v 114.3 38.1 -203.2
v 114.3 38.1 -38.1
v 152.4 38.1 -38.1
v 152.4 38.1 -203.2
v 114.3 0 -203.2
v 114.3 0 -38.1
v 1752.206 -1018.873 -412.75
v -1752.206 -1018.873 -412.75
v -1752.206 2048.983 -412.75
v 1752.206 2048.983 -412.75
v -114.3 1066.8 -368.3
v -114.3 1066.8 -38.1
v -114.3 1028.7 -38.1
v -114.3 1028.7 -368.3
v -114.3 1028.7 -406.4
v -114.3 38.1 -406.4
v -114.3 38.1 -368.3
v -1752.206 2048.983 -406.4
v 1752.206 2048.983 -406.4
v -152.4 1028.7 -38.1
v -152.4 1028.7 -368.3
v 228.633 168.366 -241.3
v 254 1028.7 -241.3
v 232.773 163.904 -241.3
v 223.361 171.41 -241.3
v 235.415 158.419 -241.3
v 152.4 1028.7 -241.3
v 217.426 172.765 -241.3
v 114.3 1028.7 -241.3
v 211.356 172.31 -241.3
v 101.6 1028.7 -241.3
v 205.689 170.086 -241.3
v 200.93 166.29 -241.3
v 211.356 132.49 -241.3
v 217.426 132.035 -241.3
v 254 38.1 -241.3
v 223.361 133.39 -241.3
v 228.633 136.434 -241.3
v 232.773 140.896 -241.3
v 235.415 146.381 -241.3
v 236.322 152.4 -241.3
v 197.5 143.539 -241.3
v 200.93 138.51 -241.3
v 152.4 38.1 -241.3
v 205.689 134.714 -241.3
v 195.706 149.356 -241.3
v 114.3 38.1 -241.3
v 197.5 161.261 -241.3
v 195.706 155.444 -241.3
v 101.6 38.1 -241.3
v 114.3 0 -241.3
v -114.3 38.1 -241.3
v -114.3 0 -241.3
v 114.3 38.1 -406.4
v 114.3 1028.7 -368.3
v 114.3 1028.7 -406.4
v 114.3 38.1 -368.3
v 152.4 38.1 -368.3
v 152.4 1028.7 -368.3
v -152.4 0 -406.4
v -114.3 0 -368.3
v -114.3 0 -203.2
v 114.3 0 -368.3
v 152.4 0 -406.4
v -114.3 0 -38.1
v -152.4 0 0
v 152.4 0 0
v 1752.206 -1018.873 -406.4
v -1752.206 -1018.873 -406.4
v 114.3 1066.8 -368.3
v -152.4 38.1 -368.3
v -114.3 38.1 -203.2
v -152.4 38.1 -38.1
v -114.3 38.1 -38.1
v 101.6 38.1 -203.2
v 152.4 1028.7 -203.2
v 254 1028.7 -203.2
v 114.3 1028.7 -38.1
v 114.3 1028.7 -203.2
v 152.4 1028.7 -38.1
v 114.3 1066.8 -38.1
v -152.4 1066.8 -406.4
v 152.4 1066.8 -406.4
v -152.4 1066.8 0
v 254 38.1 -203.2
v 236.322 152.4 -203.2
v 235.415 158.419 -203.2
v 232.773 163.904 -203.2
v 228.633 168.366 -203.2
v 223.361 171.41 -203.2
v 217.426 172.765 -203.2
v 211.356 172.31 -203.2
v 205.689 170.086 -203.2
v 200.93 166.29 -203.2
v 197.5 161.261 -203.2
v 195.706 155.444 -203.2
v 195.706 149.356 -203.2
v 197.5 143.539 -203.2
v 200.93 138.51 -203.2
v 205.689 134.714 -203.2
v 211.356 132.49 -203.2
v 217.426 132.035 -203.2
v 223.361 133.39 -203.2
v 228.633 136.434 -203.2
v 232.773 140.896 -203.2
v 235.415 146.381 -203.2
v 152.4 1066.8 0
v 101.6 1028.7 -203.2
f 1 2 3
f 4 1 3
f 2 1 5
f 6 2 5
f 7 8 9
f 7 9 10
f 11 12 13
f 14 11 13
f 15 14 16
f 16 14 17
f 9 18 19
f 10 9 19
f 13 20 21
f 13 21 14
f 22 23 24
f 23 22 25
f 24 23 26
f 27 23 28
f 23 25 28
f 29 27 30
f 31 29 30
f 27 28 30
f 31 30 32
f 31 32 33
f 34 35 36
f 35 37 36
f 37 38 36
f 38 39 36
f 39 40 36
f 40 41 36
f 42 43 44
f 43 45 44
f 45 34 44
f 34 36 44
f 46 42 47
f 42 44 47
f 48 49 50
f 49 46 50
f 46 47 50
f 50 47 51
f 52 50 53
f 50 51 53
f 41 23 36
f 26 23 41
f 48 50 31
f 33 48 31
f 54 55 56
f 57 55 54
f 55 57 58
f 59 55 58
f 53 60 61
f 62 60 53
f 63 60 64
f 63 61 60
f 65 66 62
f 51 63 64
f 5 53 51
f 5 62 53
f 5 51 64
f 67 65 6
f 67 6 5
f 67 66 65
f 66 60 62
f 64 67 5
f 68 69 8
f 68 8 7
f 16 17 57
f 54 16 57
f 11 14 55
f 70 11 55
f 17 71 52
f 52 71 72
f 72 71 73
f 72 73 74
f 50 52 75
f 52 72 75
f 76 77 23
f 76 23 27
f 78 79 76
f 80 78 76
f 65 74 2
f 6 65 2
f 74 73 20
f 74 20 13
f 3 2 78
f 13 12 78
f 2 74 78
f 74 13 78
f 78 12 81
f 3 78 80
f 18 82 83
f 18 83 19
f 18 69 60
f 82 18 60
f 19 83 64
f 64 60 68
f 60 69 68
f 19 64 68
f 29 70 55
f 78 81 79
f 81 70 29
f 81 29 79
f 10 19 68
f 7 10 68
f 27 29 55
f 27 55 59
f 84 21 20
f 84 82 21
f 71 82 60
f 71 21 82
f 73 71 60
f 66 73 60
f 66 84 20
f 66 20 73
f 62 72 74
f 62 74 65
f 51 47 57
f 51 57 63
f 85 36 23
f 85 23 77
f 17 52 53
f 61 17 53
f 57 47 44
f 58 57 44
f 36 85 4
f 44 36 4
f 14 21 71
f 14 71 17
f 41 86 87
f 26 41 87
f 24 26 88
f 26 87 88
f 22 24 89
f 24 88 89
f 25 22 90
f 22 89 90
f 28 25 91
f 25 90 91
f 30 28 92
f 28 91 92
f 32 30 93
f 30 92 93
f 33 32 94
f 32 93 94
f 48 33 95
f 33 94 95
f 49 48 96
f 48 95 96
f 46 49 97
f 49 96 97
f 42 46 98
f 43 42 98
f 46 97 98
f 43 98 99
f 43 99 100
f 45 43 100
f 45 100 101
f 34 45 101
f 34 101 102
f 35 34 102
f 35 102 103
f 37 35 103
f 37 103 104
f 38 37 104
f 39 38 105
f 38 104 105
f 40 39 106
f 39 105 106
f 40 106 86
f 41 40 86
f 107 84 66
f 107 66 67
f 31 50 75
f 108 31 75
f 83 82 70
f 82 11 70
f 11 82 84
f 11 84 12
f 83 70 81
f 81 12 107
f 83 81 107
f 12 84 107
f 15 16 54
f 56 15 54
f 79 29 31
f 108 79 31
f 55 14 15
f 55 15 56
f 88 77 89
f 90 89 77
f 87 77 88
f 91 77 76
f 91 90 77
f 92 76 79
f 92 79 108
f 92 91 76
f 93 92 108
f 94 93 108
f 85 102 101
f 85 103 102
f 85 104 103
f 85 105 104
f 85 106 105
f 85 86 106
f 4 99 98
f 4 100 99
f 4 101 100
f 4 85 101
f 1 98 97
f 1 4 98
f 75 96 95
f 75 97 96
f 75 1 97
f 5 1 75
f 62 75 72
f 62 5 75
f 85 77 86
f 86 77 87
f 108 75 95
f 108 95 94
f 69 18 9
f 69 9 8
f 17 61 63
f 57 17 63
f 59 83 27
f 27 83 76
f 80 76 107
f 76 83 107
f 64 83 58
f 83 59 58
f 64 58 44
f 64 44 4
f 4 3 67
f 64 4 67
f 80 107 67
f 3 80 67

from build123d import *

# Parameters (mm, degrees)
F0_W      = 304.8
F0_H      = 1066.8
F1_DEPTH  = 38.1
F2_W      = 38.1
F2_H      = 38.1
F3_DEPTH  = 330.2
F4_W      = 304.8
F4_H      = 1066.8
F4_W_2    = 228.6
F4_H_2    = 990.6
F5_DEPTH  = 38.1
F7_W      = 38.1
F7_H      = 38.1
F8_DEPTH  = 228.6
F9_W      = 152.4
F9_H      = 38.1
F10_DEPTH = 990.6
F11_DEPTH = 990.6
F12_R     = 20.421914
F13_DEPTH = 38.1
F14_W     = 3504.41122
F14_H     = 3067.855716
F15_DEPTH = 6.35


with BuildPart() as f1:
    # F0 (on Top) → F1 (new body)
    with BuildSketch(Plane.XY):
        with Locations((0, 533.4)):
            Rectangle(F0_W, F0_H)
    extrude(amount=-F1_DEPTH)

    # F2 (on face) → F3 (join)
    with BuildSketch(Plane(origin=(0, 0, -38.1), x_dir=(1, 0, 0), z_dir=(0, 0, -1))):
        with Locations((-133.35, -19.05)):
            Rectangle(F2_W, F2_H)
        with Locations((133.35, -19.05)):
            Rectangle(F2_W, F2_H)
        with Locations((133.35, -1047.75)):
            Rectangle(F2_W, F2_H)
        with Locations((-133.35, -1047.75)):
            Rectangle(F2_W, F2_H)
    extrude(amount=F3_DEPTH)

    # F4 (on face) → F5 (join)
    with BuildSketch(Plane(origin=(0, 0, -368.3), x_dir=(1, 0, 0), z_dir=(0, 0, -1))):
        with Locations((0, -533.4)):
            Rectangle(F4_W, F4_H)
        with Locations((0, -533.4)):
            Rectangle(F4_W_2, F4_H_2, mode=Mode.SUBTRACT)
    extrude(amount=F5_DEPTH)

    # F7 (on face) → F8 (join, through all)
    with BuildSketch(Plane.YZ.offset(-114.3)):
        with Locations((19.05, -222.25)):
            Rectangle(F7_W, F7_H)
    extrude(amount=F8_DEPTH)

    # F9 (on face) → F10 (join, through all)
    with BuildSketch(Plane(origin=(0, 38.1, 0), x_dir=(-1, 0, 0), z_dir=(0, 1, 0))):
        with Locations((-177.8, -222.25)):
            Rectangle(F9_W, F9_H)
    extrude(amount=F10_DEPTH)

    # F9 (on face) → F11 (join, through all)
    with BuildSketch(Plane(origin=(0, 38.1, 0), x_dir=(-1, 0, 0), z_dir=(0, 1, 0))):
        with Locations((-177.8, -222.25)):
            Rectangle(F9_W, F9_H)
    extrude(amount=F11_DEPTH)

    # F12 (on face) → F13 (cut, through all)
    with BuildSketch(Plane.XY.offset(-203.2)):
        with Locations((215.9, 152.4)):
            Circle(F12_R)
    extrude(amount=-F13_DEPTH, mode=Mode.SUBTRACT)

    # F14 (on face) → F15 (join)
    with BuildSketch(Plane(origin=(0, 0, -406.4), x_dir=(1, 0, 0), z_dir=(0, 0, -1))):
        with Locations((0, -515.055001)):
            Rectangle(F14_W, F14_H)
    extrude(amount=F15_DEPTH)


solid = f1.part
